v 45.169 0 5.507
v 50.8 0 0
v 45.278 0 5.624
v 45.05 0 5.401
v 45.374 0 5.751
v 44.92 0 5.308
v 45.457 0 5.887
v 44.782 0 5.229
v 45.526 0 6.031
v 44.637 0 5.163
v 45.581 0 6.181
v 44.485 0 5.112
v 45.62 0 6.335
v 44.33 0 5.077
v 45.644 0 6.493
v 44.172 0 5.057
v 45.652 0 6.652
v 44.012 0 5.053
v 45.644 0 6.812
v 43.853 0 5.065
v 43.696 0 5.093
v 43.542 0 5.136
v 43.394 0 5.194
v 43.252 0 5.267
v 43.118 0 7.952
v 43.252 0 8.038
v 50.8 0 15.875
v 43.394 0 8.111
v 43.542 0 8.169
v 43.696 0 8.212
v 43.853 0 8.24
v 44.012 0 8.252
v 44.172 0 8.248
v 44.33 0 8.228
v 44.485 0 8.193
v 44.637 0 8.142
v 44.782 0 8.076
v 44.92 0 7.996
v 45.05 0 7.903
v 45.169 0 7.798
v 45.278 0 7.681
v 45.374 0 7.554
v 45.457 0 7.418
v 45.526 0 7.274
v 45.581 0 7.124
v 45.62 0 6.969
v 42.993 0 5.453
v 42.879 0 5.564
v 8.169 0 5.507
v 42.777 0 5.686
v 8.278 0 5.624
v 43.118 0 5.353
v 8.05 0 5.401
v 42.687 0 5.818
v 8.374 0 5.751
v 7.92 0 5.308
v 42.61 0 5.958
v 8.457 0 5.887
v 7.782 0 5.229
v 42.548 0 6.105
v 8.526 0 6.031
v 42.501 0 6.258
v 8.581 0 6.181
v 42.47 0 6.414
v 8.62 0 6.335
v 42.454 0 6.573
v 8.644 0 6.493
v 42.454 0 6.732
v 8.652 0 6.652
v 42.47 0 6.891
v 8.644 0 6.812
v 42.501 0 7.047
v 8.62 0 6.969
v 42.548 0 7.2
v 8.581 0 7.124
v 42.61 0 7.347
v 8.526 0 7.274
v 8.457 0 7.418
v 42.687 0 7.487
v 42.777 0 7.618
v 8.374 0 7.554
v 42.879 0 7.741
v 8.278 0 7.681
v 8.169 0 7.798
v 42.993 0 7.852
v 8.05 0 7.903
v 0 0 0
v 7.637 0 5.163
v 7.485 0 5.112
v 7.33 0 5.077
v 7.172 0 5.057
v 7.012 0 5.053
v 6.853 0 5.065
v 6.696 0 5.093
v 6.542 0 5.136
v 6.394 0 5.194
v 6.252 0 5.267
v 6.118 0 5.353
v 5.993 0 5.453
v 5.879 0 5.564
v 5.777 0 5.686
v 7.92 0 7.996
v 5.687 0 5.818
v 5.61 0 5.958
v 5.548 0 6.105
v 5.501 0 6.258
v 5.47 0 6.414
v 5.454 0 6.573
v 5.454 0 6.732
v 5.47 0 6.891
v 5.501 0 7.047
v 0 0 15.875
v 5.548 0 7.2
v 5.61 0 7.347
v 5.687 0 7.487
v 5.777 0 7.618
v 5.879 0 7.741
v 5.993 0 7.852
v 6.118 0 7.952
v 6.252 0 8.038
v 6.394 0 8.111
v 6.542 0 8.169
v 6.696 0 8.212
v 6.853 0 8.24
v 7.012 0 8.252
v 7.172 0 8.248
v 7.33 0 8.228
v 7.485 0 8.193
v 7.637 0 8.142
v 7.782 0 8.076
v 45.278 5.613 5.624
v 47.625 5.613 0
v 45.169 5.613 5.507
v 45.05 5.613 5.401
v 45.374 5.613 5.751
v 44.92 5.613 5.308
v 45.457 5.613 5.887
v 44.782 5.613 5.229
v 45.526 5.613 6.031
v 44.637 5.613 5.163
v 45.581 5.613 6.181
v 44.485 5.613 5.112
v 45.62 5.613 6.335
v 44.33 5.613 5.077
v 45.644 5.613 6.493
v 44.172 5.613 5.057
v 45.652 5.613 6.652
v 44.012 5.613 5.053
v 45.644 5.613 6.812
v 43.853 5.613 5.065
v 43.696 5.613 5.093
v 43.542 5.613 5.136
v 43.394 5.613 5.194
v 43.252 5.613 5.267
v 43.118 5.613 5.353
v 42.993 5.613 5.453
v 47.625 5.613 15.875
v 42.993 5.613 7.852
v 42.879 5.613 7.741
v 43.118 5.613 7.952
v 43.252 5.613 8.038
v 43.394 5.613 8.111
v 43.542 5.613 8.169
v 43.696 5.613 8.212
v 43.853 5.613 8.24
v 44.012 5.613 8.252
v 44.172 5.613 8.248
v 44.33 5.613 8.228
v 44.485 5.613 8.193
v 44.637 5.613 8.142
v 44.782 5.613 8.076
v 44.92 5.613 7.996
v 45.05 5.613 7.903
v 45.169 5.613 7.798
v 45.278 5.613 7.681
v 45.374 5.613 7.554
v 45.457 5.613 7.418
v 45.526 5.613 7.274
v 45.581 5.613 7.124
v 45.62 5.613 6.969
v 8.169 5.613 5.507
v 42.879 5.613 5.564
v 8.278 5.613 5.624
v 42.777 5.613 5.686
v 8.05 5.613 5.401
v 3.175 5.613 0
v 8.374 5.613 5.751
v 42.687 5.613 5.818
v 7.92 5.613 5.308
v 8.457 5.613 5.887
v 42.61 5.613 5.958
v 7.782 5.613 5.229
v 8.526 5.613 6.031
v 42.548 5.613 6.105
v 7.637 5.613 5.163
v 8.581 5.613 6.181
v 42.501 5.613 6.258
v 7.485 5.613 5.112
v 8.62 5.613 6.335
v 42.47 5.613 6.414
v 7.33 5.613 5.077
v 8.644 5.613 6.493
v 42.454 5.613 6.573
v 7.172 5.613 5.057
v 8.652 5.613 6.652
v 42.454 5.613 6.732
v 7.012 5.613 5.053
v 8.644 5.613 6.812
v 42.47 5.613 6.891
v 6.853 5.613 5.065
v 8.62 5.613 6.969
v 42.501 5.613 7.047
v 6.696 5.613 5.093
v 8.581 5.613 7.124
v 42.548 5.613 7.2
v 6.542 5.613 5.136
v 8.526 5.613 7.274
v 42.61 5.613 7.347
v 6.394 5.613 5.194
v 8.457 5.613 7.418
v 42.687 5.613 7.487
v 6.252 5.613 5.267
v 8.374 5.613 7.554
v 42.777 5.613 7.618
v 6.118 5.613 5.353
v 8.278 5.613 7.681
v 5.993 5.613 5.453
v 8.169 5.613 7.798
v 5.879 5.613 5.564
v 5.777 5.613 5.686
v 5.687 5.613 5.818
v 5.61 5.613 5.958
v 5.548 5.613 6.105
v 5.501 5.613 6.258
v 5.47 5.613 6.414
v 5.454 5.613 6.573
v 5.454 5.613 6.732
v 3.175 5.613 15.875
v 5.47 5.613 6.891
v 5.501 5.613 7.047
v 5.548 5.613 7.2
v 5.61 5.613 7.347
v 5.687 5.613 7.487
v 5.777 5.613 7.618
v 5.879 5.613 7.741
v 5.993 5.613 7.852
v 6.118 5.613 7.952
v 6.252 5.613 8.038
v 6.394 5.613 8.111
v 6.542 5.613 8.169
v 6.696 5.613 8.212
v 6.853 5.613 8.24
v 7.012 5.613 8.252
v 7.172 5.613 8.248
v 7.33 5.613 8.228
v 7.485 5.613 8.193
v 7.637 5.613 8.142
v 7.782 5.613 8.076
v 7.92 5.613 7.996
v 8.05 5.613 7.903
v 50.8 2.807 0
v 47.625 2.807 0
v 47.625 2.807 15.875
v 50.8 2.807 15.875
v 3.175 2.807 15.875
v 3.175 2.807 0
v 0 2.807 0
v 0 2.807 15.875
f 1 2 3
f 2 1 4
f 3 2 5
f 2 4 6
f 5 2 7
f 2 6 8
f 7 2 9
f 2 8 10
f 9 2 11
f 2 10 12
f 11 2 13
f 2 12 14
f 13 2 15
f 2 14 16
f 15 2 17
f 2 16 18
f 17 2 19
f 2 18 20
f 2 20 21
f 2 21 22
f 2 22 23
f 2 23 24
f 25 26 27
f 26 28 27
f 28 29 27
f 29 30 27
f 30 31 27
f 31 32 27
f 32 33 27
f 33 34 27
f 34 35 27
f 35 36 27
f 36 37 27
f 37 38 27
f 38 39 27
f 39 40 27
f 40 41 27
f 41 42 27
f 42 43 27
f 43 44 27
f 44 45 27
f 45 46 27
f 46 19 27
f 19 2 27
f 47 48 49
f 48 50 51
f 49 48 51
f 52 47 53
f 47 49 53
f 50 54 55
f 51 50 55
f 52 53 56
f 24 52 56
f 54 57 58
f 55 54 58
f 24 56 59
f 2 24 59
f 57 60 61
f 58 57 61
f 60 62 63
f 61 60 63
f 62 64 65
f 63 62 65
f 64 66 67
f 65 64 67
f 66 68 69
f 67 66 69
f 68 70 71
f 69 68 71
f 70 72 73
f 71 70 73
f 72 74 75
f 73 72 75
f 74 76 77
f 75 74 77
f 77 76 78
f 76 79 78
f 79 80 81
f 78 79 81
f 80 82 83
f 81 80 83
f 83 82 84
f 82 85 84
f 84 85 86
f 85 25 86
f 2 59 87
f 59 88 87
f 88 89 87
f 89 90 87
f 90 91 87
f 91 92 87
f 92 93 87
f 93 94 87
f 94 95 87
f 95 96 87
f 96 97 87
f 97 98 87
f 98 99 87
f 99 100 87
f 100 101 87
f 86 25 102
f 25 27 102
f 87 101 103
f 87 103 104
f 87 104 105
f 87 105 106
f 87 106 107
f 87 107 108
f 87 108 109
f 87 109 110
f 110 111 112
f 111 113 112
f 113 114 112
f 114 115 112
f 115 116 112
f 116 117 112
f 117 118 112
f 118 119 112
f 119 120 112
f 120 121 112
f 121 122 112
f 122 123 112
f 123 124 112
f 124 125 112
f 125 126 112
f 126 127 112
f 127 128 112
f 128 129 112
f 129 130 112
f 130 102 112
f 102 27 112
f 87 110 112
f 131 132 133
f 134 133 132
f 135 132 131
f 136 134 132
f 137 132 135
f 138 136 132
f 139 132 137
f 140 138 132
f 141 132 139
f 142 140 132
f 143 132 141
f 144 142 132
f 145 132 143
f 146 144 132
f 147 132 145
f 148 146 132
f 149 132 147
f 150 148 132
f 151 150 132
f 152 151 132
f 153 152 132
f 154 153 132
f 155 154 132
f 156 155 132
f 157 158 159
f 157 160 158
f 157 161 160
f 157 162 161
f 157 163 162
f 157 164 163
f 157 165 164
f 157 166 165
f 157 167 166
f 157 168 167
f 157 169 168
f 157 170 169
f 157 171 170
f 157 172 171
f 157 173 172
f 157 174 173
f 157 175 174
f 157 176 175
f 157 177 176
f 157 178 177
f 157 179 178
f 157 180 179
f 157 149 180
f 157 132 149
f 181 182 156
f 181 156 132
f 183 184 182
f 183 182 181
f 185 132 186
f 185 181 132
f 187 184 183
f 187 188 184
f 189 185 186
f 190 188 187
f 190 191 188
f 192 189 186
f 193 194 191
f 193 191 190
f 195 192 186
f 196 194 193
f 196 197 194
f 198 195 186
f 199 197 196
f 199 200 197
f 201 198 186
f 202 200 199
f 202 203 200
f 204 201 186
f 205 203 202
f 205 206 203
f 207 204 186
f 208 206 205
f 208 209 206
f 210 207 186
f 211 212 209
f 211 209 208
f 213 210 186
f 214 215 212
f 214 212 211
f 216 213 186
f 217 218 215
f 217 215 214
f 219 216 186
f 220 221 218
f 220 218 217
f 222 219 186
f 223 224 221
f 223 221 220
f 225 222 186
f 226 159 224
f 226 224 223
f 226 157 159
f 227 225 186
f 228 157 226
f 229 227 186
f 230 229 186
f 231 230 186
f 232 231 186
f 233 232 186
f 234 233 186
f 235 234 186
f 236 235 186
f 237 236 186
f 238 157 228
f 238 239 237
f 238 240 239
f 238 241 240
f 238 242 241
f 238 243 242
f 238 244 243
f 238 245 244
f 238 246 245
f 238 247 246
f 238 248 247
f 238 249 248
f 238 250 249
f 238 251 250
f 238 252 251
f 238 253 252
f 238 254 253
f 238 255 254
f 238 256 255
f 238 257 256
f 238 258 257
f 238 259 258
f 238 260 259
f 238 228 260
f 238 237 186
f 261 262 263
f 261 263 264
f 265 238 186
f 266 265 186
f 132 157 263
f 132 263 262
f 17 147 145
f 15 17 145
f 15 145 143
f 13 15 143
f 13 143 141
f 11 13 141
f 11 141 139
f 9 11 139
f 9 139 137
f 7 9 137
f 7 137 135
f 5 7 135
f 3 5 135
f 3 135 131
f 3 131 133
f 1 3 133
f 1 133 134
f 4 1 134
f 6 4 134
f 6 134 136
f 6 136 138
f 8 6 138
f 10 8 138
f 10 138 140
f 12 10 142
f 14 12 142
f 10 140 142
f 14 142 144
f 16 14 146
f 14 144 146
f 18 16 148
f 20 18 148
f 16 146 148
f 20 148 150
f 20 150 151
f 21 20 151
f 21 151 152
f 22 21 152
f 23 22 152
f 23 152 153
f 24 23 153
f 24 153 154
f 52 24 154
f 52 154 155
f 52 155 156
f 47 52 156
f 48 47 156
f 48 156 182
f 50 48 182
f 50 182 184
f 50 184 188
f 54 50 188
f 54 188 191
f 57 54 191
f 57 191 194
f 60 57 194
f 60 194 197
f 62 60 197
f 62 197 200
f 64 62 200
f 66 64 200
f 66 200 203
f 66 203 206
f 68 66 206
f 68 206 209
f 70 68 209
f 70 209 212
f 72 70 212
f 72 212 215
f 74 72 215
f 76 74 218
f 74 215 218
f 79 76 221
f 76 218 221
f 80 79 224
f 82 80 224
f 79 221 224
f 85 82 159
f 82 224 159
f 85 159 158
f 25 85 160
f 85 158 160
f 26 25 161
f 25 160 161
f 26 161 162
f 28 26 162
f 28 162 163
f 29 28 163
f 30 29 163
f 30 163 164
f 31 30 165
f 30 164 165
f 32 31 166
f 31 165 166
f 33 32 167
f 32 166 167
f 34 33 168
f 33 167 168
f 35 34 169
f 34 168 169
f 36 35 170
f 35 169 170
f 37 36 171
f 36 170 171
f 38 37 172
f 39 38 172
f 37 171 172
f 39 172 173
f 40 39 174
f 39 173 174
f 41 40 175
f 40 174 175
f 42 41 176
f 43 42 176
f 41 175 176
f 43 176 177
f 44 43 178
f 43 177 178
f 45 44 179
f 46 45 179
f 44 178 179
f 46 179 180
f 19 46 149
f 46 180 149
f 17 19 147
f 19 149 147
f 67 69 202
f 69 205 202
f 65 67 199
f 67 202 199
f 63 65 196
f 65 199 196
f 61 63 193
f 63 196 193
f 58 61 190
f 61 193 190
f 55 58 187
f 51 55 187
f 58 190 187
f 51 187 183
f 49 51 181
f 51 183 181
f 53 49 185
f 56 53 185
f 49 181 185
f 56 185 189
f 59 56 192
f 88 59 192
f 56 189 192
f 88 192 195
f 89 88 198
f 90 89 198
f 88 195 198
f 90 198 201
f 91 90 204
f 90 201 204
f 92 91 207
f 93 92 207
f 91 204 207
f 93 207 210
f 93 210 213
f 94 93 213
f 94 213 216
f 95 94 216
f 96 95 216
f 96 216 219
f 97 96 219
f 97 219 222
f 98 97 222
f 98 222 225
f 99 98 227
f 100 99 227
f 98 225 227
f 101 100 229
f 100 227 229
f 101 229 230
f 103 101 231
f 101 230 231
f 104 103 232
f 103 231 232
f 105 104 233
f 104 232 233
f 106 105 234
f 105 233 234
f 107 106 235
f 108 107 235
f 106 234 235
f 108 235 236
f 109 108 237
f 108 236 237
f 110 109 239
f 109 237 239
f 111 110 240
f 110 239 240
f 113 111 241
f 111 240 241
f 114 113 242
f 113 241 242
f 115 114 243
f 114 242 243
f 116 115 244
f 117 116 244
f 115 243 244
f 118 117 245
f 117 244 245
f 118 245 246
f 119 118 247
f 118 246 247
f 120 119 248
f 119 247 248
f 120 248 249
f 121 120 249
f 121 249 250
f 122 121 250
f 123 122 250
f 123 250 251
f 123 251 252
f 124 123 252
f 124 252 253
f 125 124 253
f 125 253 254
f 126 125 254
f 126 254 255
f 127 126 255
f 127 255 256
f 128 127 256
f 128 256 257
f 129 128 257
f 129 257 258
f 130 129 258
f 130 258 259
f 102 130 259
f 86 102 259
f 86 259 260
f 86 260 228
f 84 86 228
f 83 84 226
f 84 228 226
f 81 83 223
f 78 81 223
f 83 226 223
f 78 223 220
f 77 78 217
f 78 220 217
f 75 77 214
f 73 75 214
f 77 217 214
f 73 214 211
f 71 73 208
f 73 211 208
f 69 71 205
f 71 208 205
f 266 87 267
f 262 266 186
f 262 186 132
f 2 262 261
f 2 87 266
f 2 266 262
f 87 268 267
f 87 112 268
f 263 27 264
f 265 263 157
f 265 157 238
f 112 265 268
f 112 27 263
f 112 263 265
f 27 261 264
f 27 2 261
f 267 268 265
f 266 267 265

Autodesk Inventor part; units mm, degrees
ref_plane "YZ Plane" through (0, 0, 0) normal (1, 0, 0) x (0, 1, 0)
ref_plane "XZ Plane" through (0, 0, 0) normal (0, 1, 0) x (-1, 0, 0)
ref_plane "XY Plane" through (0, 0, 0) normal (0, 0, 1) x (1, 0, 0)
sketch "Sketch1" plane through (0, 0, 0) normal (0, 1, 0) x (-1, 0, 0)
  line L0 (0, 0) -> (-50.8, 0)
  line L1 (-50.8, 0) -> (-50.8, 15.875)
  line L2 (-50.8, 15.875) -> (0, 15.875)
  line L3 (0, 15.875) -> (0, 0)
  dimension "d0" = 50.8
  dimension "d1" = 15.875
extrude "Extrusion1" add sketch "Sketch1" along normal blind 5.6134
sketch "Sketch7" plane through (0, 5.6134, 0) normal (0, 1, 0) x (1, 0, 0)
  circle A0 centre (7.052, -6.6524) radius 1.6
  circle A1 centre (44.052, -6.6524) radius 1.6
  line L0 (0, 0) -> (0, -15.875) projected
  line L1 (50.8, 0) -> (0, 0) projected
  dimension "d22" = 3.2
  dimension "d23" = 3.2
  dimension "d24" = 37
  dimension "d42" = 7.052
  dimension "d43" = 6.6524
  dimension "d44" = 6.6524
extrude "Extrusion6" cut sketch "Sketch7" against normal blind 25.4
sketch "Sketch8" plane through (0, 5.6134, 0) normal (0, 1, 0) x (1, 0, 0)
  line L0 (50.8, 0) -> (0, 0) projected
  line L1 (0, 0) -> (0, -15.875) projected
  line L2 (50.8, -15.875) -> (50.8, 0) projected
  line L3 (0, -15.875) -> (3.175, -15.875)
  line L4 (3.175, -15.875) -> (3.175, 0)
  line L5 (3.175, 0) -> (0, 0)
  line L6 (0, 0) -> (0, -15.875)
  line L7 (50.8, -15.875) -> (47.625, -15.875)
  line L8 (47.625, -15.875) -> (47.625, 0)
  line L9 (47.625, 0) -> (50.8, 0)
  line L10 (50.8, 0) -> (50.8, -15.875)
  dimension "d34" = 3.175
  dimension "d35" = 3.175
extrude "Extrusion7" cut sketch "Sketch8" against normal blind 2.8067
equation "\"d23\" = d22"
properties part number "Lidar Sensor Case Piece 3"
